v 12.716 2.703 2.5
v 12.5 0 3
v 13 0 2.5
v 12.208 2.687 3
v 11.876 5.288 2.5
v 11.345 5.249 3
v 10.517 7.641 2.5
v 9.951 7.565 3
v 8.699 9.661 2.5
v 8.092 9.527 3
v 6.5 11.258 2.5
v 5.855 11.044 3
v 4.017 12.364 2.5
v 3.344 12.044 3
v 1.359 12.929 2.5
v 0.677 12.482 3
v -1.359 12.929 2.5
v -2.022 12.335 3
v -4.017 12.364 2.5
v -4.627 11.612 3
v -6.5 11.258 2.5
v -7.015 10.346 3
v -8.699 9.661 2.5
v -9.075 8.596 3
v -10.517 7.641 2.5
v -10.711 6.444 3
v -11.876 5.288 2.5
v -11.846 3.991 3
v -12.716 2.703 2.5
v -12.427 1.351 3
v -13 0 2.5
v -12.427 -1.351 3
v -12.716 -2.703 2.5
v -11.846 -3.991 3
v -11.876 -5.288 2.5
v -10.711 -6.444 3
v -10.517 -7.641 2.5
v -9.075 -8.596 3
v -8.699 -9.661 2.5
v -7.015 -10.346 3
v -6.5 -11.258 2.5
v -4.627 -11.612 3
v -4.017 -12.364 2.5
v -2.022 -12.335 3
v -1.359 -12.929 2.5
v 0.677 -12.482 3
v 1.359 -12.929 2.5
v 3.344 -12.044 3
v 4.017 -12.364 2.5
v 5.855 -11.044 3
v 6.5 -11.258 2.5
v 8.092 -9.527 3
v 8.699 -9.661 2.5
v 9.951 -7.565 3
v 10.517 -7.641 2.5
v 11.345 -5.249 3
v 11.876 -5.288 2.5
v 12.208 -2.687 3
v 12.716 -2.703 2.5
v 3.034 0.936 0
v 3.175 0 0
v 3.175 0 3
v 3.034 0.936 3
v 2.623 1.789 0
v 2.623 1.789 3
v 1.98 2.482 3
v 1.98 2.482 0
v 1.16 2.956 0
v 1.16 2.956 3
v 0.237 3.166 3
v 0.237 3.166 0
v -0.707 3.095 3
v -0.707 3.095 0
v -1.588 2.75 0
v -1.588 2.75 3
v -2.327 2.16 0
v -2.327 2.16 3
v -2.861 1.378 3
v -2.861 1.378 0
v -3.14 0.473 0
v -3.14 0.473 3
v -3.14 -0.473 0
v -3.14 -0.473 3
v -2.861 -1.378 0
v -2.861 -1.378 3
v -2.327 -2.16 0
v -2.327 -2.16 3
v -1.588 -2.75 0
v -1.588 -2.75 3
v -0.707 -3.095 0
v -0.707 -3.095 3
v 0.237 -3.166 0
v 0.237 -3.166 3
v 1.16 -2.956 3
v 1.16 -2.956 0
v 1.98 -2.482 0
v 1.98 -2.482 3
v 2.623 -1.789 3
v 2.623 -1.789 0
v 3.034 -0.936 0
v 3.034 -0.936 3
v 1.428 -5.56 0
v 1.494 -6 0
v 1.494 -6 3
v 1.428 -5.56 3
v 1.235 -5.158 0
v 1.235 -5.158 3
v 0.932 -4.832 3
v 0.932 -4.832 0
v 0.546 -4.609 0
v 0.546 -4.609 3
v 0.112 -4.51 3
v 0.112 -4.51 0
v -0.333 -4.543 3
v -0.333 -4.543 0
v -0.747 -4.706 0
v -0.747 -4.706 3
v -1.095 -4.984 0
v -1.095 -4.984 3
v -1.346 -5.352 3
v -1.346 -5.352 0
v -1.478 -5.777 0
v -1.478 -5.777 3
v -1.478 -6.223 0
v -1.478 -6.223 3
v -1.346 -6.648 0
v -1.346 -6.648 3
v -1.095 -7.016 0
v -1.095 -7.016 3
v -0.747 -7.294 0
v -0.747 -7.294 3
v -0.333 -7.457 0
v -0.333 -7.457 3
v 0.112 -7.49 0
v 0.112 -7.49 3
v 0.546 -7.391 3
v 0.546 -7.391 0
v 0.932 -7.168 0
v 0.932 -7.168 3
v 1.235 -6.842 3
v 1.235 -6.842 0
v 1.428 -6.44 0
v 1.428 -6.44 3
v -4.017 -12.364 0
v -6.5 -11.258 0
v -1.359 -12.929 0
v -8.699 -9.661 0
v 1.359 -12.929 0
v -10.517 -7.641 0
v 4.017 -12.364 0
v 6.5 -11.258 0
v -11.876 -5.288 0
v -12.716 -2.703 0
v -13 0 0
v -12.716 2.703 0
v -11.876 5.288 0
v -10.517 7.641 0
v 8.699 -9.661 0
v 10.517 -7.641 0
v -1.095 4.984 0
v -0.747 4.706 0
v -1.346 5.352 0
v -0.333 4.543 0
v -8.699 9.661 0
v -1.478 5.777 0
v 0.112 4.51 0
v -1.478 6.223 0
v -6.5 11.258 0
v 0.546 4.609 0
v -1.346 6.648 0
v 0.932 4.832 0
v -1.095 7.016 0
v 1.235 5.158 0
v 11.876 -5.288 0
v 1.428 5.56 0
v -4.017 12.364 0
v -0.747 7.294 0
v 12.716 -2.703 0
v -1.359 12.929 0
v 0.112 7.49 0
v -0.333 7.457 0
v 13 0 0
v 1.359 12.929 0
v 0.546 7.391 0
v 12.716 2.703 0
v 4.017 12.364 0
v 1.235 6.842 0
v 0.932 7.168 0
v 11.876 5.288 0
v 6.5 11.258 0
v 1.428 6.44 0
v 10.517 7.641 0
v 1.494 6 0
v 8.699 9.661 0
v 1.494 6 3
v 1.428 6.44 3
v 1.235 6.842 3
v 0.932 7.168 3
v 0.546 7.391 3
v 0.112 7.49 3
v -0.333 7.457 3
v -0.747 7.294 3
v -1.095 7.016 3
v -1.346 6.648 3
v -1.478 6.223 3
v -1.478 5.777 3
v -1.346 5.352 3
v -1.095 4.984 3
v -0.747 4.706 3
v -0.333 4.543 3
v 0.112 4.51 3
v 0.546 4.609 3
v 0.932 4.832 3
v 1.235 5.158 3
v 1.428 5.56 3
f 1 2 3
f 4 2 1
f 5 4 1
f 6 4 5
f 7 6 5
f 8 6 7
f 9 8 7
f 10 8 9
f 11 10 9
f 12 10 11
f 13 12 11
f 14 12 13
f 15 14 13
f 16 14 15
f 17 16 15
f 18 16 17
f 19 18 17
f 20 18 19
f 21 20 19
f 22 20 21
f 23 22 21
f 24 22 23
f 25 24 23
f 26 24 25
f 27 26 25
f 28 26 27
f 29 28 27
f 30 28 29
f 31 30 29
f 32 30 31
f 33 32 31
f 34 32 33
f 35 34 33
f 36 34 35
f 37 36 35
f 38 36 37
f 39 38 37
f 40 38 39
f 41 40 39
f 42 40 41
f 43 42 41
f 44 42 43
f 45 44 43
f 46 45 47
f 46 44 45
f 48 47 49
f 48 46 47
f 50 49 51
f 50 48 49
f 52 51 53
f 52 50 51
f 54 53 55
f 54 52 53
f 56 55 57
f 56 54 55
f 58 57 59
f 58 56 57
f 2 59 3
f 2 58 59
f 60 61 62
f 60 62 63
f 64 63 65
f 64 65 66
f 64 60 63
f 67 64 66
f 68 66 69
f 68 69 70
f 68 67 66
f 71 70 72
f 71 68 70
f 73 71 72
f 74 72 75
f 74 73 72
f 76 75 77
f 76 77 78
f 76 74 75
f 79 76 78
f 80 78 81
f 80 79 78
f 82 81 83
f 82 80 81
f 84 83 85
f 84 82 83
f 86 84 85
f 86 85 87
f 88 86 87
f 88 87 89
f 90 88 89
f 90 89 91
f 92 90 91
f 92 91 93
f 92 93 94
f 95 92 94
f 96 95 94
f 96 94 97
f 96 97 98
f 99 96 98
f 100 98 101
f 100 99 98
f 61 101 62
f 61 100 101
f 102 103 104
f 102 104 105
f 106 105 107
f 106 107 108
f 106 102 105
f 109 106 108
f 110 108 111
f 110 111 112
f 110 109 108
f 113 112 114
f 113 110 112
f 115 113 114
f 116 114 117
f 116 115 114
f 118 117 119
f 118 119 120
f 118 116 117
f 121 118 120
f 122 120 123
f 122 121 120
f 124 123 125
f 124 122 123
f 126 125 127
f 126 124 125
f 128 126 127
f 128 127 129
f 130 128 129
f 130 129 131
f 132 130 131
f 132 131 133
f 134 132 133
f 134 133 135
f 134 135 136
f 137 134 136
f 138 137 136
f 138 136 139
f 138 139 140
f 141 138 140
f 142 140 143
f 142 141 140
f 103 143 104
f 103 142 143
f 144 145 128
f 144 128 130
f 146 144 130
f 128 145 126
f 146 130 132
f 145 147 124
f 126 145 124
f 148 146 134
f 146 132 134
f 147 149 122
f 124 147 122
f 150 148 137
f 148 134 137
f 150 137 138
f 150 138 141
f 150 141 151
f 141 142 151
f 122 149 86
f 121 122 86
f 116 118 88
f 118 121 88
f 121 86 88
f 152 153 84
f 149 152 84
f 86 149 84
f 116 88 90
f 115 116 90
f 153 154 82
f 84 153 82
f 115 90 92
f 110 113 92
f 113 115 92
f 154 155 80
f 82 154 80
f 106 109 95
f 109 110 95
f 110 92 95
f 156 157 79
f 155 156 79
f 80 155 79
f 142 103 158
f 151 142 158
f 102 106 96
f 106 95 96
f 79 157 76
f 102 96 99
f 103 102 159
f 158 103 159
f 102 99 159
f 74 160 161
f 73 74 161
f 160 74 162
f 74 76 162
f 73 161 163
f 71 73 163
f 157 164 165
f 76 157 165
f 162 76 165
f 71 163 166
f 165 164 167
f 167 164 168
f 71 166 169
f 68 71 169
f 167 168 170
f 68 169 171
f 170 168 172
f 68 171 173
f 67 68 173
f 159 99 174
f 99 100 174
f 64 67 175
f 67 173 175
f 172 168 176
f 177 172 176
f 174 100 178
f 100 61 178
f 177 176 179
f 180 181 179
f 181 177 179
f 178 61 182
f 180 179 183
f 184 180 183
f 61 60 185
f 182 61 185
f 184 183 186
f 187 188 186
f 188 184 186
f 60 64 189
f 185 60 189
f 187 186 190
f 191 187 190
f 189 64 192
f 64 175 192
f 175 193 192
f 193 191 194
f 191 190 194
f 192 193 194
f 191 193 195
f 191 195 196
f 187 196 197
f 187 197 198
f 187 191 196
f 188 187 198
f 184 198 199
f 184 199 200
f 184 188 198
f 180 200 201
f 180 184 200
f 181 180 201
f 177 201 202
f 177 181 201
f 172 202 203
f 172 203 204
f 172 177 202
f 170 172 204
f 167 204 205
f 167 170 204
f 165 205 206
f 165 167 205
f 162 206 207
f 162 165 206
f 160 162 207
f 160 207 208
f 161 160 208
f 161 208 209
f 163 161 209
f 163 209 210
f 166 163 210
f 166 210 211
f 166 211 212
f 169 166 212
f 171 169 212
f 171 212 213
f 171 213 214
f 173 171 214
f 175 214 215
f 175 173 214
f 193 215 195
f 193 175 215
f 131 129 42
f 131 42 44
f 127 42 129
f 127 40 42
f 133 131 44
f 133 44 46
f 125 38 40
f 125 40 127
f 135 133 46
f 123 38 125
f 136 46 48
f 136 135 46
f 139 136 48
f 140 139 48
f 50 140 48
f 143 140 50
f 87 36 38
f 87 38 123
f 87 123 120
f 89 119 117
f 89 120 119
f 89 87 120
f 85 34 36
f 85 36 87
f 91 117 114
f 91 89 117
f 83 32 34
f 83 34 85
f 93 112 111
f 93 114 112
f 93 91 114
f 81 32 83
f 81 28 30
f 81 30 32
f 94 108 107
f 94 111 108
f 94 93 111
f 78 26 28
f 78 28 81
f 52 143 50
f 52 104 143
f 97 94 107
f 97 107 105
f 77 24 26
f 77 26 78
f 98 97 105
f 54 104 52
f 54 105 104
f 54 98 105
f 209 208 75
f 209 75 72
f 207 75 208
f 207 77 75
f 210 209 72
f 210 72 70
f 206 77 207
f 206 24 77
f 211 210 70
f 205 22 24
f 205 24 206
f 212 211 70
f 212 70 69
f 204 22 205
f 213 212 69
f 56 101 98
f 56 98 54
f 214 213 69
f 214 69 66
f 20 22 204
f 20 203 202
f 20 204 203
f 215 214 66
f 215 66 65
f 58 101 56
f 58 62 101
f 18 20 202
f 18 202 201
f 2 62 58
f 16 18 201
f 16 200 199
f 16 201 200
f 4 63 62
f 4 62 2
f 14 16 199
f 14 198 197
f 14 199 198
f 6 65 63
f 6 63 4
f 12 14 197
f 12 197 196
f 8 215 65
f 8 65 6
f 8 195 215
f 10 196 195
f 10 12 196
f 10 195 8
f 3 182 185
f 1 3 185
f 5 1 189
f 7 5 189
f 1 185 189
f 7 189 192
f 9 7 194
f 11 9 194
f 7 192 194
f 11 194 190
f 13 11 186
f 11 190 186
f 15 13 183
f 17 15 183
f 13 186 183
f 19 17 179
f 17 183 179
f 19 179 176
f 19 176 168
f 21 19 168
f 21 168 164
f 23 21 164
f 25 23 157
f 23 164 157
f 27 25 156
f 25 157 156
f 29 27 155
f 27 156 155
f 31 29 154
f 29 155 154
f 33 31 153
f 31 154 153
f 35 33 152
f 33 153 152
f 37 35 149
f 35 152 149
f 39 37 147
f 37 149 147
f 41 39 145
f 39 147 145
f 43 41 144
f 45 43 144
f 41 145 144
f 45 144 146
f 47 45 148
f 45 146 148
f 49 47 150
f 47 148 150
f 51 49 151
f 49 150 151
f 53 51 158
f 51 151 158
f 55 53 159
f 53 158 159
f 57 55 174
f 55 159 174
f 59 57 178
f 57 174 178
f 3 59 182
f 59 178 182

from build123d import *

# Parameters (mm, degrees)
SKETCH_1_R      = 13
SKETCH_1_R_2    = 3.175
SKETCH_1_R_3    = 1.494405319
EXTRUDE_1_DEPTH = 3
CHAMFER_1_SIZE  = 0.5


with BuildPart() as part:
    # Эскиз1 → Вытянуть1 (new body)
    with BuildSketch(Plane.XY):
        Circle(SKETCH_1_R)
        Circle(SKETCH_1_R_2, mode=Mode.SUBTRACT)
        with Locations((0, 6)):
            Circle(SKETCH_1_R_3, mode=Mode.SUBTRACT)
        with Locations((0, -6)):
            Circle(SKETCH_1_R_3, mode=Mode.SUBTRACT)
    extrude(amount=EXTRUDE_1_DEPTH)

    # Фаска1
    chamfer_1_edges = [part.edges().sort_by_distance(p)[0] for p in [
        (-13, 0, 3),
    ]]
    chamfer(chamfer_1_edges, length=CHAMFER_1_SIZE)


solid = part.part
